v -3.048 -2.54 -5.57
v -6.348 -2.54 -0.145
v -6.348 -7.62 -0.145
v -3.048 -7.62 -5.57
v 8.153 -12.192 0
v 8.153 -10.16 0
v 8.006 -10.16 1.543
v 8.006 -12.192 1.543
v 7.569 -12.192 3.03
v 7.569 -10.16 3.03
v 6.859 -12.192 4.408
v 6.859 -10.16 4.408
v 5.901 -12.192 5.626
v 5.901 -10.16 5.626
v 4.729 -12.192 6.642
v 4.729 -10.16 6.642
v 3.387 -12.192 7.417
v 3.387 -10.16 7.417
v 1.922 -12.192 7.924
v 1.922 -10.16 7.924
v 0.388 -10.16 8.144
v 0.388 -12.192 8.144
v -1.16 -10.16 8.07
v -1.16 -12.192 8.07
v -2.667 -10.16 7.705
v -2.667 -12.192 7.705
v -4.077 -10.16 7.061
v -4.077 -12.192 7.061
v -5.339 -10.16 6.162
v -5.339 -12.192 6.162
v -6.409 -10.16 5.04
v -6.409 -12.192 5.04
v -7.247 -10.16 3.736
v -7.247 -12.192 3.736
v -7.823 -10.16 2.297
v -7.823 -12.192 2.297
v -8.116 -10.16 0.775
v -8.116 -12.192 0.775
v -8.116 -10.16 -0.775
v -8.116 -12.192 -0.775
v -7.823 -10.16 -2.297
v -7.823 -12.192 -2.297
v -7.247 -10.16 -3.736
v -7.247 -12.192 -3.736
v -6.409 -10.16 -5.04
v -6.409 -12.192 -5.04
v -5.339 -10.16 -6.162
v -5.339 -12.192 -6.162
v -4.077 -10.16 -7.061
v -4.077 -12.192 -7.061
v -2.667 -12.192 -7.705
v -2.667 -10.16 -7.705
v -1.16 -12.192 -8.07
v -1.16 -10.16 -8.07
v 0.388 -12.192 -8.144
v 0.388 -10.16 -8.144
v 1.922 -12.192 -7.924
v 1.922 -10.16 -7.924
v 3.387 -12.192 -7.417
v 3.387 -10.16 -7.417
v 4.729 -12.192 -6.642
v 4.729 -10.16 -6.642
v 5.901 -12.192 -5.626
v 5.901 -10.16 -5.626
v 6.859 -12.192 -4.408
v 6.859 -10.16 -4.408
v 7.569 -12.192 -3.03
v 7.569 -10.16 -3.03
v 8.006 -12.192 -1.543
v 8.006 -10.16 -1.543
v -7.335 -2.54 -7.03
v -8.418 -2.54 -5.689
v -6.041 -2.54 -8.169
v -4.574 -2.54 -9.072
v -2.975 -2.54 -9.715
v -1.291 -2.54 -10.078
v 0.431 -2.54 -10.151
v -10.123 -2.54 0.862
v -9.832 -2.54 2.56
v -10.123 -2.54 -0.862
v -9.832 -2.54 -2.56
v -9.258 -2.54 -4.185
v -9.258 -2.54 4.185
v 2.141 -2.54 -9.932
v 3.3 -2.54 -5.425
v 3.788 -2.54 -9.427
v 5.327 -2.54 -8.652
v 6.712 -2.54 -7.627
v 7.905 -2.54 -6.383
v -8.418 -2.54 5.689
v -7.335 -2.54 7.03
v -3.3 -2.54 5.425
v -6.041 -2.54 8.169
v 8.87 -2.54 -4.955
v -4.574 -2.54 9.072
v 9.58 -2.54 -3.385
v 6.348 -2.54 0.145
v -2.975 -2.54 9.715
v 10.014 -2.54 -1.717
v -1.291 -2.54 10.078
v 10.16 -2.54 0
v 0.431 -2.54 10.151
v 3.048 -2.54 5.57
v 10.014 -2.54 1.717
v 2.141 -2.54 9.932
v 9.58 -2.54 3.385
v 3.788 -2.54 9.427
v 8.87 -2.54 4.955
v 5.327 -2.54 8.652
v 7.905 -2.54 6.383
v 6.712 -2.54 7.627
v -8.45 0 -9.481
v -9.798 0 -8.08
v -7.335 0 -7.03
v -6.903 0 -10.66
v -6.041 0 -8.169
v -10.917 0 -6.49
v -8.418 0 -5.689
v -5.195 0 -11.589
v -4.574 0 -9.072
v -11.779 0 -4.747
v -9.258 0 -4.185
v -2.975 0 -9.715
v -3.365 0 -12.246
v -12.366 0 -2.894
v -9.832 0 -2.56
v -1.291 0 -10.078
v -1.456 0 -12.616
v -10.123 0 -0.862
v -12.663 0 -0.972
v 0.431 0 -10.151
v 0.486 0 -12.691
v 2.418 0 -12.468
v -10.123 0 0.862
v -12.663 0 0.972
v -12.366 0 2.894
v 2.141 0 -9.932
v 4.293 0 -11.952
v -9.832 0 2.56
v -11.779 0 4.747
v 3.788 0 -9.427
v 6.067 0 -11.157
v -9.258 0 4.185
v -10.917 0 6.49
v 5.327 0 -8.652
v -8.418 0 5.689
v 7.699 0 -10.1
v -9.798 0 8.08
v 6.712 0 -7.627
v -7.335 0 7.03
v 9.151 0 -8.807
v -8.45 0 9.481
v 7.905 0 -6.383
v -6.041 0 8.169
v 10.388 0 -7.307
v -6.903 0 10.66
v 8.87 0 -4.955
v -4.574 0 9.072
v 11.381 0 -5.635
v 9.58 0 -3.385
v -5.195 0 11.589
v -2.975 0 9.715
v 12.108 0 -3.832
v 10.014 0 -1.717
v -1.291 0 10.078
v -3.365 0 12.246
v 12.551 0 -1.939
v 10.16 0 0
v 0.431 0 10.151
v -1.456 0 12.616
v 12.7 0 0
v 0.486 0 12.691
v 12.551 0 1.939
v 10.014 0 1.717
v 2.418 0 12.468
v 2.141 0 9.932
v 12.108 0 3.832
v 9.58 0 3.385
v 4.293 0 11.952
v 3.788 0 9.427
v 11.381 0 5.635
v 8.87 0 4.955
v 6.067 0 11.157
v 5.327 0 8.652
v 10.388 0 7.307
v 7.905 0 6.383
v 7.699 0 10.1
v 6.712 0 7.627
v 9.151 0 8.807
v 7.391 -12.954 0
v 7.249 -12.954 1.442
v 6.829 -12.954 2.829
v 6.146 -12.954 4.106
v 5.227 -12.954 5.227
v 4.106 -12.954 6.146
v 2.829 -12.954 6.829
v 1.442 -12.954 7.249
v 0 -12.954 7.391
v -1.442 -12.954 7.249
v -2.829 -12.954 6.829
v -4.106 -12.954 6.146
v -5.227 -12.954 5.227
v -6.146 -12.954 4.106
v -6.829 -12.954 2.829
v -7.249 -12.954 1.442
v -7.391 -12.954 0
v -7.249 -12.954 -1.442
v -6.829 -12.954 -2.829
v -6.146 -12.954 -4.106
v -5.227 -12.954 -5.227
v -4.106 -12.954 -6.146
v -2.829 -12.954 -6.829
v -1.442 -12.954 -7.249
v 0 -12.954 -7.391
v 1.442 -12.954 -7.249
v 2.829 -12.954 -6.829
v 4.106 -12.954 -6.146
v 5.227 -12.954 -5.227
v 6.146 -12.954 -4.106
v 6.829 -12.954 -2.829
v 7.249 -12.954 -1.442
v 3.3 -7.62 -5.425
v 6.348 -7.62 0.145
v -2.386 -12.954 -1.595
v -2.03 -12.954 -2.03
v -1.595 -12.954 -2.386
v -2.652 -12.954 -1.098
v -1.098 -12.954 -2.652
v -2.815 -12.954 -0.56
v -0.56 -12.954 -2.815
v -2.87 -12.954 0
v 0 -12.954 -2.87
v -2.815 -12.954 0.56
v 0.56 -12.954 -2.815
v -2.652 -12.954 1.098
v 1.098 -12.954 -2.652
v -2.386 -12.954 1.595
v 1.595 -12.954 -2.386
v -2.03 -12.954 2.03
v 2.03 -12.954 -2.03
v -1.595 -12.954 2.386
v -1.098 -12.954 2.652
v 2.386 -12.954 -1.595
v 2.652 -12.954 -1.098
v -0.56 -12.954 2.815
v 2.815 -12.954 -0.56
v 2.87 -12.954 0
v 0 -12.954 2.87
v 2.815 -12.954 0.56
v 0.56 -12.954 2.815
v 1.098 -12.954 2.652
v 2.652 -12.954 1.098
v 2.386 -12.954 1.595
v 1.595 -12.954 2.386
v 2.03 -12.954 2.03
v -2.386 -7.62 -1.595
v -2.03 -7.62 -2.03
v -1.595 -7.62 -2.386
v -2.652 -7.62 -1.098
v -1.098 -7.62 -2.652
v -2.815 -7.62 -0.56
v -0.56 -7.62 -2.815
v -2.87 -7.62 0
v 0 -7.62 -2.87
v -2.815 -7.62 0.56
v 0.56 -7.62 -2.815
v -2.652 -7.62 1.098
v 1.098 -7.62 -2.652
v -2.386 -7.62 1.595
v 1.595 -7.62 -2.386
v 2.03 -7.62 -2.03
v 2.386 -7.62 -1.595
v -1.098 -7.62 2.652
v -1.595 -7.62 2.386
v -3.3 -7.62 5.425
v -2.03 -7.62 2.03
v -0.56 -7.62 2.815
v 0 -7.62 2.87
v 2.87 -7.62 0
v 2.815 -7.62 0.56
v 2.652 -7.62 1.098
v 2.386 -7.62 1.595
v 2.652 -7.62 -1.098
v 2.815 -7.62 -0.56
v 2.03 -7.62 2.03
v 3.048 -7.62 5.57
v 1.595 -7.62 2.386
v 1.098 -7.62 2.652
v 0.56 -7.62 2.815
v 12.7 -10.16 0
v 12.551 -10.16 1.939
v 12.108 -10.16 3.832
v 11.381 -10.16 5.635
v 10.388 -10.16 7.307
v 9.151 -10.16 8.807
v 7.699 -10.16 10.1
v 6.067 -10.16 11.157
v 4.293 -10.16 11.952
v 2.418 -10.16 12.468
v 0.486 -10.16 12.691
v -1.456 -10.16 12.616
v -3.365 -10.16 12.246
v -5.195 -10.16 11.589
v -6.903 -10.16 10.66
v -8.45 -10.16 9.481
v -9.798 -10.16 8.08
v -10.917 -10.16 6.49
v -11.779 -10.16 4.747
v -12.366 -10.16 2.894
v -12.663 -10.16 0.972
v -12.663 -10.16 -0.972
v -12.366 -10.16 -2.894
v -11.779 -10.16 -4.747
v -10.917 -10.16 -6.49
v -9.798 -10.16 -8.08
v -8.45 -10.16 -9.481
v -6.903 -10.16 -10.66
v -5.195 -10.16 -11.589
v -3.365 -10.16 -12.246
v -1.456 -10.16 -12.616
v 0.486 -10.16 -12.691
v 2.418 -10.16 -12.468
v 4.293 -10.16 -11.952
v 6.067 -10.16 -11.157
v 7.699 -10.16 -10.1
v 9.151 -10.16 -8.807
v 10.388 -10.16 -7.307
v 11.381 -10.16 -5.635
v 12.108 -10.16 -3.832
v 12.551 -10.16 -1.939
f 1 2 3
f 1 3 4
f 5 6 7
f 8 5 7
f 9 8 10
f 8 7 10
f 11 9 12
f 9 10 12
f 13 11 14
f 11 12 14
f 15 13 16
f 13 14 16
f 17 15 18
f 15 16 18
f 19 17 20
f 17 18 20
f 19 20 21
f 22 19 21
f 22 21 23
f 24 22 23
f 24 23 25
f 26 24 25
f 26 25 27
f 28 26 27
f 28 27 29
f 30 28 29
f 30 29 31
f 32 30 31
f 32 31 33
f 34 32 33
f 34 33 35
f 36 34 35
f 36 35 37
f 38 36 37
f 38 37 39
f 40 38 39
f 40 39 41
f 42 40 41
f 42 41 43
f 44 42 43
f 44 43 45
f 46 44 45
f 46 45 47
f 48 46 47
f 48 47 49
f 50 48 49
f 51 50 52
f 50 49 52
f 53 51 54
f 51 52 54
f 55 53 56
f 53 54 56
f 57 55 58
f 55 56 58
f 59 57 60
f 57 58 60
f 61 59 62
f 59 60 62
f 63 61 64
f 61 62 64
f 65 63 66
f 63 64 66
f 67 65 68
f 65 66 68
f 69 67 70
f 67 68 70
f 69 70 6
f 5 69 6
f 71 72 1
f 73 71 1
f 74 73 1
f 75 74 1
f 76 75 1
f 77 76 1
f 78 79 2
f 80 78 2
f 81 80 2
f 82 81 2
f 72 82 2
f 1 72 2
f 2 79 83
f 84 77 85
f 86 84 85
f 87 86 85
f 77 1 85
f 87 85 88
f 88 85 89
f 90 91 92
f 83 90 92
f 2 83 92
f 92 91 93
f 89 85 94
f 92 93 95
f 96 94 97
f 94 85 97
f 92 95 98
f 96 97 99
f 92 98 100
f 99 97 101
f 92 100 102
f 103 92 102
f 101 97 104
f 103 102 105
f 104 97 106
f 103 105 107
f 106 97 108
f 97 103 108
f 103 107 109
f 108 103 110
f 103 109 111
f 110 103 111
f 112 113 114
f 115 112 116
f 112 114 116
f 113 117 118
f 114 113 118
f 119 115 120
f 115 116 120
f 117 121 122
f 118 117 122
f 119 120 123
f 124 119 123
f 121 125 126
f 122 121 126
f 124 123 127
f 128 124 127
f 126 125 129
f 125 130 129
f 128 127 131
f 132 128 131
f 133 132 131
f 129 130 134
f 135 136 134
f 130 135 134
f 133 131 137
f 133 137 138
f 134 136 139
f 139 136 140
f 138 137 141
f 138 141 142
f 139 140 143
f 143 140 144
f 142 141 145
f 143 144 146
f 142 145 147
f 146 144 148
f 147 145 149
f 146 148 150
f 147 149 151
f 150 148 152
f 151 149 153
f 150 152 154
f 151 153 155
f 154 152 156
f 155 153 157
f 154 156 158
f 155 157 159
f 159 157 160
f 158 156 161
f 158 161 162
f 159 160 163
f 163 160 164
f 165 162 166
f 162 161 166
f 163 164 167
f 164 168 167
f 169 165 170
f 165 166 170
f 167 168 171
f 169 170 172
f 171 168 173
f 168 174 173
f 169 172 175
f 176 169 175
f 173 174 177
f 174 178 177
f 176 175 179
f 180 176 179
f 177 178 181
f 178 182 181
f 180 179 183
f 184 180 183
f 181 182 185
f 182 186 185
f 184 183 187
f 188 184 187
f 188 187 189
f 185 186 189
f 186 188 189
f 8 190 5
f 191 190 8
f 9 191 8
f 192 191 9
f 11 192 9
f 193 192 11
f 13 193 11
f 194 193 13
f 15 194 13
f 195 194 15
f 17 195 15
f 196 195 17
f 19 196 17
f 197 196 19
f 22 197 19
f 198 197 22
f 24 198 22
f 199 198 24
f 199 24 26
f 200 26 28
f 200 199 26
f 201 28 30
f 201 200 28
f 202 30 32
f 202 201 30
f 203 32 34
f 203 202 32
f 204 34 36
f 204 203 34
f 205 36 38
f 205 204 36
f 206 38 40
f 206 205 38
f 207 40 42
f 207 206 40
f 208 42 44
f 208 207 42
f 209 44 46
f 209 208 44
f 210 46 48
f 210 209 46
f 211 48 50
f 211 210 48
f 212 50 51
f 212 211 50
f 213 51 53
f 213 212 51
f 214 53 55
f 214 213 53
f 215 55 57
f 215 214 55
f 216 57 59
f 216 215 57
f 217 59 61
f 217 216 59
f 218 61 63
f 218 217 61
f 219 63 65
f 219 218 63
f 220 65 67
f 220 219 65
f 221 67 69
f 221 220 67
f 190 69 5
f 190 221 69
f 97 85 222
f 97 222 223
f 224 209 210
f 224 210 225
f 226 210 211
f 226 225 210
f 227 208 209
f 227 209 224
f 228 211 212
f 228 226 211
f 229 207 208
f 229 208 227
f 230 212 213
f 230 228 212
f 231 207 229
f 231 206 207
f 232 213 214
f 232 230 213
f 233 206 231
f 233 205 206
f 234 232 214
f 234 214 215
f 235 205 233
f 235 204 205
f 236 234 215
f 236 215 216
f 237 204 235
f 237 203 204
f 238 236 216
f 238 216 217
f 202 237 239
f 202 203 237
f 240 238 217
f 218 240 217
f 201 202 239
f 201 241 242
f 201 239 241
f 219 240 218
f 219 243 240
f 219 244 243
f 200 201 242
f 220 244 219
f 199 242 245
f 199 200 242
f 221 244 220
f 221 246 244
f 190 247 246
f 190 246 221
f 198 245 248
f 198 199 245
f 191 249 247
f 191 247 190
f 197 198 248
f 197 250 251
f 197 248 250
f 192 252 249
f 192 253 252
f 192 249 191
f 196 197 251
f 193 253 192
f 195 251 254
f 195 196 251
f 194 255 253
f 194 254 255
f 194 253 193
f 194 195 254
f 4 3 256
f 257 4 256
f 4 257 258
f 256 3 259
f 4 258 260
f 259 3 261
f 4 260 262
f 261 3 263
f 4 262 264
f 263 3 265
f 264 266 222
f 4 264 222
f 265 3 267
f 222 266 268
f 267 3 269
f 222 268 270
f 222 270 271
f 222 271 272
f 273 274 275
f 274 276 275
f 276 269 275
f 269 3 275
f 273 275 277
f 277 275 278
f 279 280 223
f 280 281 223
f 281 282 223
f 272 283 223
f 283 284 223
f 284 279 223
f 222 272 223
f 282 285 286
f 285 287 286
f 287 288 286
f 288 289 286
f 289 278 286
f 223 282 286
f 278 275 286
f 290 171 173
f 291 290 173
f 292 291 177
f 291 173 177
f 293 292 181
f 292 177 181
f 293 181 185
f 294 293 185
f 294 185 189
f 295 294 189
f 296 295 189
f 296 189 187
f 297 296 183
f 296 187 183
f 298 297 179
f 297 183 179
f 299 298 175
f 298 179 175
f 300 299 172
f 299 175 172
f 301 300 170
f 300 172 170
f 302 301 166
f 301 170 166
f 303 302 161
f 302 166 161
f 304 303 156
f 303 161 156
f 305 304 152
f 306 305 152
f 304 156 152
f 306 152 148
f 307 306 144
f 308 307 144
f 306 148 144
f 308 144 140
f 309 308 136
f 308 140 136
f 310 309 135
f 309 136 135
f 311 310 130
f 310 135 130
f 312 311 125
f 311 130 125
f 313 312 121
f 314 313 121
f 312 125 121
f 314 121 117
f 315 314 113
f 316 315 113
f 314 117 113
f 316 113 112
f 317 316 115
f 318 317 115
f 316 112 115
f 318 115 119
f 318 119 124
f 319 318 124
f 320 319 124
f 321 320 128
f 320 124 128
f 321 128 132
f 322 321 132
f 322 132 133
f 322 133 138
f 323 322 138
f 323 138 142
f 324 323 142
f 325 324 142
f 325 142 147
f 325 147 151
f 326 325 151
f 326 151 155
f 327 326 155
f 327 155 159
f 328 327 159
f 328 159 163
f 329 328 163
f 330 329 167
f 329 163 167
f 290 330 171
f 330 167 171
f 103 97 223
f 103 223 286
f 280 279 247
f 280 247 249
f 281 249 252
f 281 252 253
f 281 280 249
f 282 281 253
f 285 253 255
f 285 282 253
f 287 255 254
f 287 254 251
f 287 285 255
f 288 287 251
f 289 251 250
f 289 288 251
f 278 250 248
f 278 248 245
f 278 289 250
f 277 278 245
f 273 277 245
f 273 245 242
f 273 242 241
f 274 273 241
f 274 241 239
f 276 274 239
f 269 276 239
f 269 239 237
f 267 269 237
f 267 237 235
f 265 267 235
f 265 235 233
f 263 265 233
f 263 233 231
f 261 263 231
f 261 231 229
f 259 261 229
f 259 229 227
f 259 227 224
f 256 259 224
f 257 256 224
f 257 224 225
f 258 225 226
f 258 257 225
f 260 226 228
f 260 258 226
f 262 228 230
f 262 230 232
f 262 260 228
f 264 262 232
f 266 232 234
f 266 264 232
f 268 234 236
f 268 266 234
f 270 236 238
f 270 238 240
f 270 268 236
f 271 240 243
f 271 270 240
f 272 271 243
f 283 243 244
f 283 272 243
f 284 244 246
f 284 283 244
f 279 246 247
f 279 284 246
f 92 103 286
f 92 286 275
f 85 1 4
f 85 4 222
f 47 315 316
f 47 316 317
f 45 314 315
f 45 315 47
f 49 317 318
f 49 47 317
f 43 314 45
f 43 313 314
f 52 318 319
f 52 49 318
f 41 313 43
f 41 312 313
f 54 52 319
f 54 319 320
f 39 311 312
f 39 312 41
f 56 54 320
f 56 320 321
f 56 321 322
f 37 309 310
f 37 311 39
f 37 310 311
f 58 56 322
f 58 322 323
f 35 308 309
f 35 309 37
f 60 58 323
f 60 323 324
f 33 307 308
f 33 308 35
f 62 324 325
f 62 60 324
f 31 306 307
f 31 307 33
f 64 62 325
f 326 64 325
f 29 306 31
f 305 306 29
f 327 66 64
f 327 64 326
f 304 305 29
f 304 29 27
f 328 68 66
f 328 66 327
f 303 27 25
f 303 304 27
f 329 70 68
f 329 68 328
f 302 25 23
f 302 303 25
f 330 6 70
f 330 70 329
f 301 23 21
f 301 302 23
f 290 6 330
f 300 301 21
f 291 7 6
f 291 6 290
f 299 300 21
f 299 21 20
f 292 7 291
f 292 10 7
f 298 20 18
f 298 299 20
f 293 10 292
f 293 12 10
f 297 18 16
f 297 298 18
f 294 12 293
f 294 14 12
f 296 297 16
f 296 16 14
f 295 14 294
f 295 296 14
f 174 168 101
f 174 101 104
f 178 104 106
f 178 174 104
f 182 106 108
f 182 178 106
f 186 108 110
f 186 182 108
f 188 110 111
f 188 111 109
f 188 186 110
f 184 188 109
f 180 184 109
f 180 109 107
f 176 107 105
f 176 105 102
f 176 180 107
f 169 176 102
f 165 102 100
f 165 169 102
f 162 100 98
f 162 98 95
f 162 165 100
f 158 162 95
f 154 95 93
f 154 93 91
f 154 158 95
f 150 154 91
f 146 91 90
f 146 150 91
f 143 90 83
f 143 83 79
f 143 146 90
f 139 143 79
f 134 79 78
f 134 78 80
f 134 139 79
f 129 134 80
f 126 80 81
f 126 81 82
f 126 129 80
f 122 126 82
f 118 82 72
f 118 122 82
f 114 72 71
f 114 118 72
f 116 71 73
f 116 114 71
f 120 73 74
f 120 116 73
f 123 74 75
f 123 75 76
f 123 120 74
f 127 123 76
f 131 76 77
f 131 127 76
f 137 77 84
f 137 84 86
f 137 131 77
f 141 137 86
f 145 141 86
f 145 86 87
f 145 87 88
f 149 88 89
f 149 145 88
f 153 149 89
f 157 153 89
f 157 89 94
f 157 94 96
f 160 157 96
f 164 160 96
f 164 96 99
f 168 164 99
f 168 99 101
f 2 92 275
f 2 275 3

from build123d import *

# Parameters (mm, degrees)
F0_R     = 12.7
F0_R_2   = 10.16
F0_R_3   = 8.1534
F0_R_4   = 2.8702
F1_DEPTH = 10.16
F2_DEPTH = 12.954
F3_DEPTH = 2.54
F4_DEPTH = 7.62
F5_SIZE  = 0.762


with BuildPart() as f1:
    # F0 (on Front) → F1 (new body)
    with BuildSketch(Plane.XZ):
        Circle(F0_R)
        Circle(F0_R_2, mode=Mode.SUBTRACT)
        Circle(F0_R_2)
        Circle(F0_R_3, mode=Mode.SUBTRACT)
        Circle(F0_R_3)
        Polygon((-3.299791, 5.425082), (3.048363, 5.570244), (6.348154, 0.145162), (3.299791, -5.425082), (-3.048363, -5.570244), (-6.348154, -0.145162), align=None, mode=Mode.SUBTRACT)
        Polygon((6.348154, 0.145162), (3.048363, 5.570244), (-3.299791, 5.425082), (-6.348154, -0.145162), (-3.048363, -5.570244), (3.299791, -5.425082), align=None)
        Circle(F0_R_4, mode=Mode.SUBTRACT)
    extrude(amount=F1_DEPTH)

    # F0 (on Front) → F2 (join)
    with BuildSketch(Plane.XZ):
        Circle(F0_R_3)
        Polygon((-3.299791, 5.425082), (3.048363, 5.570244), (6.348154, 0.145162), (3.299791, -5.425082), (-3.048363, -5.570244), (-6.348154, -0.145162), align=None, mode=Mode.SUBTRACT)
        Polygon((6.348154, 0.145162), (3.048363, 5.570244), (-3.299791, 5.425082), (-6.348154, -0.145162), (-3.048363, -5.570244), (3.299791, -5.425082), align=None)
        Circle(F0_R_4, mode=Mode.SUBTRACT)
    extrude(amount=F2_DEPTH)

    # F0 (on Front) → F3 (cut)
    with BuildSketch(Plane.XZ):
        Circle(F0_R_2)
        Circle(F0_R_3, mode=Mode.SUBTRACT)
        Circle(F0_R_3)
        Polygon((-3.299791, 5.425082), (3.048363, 5.570244), (6.348154, 0.145162), (3.299791, -5.425082), (-3.048363, -5.570244), (-6.348154, -0.145162), align=None, mode=Mode.SUBTRACT)
        Polygon((6.348154, 0.145162), (3.048363, 5.570244), (-3.299791, 5.425082), (-6.348154, -0.145162), (-3.048363, -5.570244), (3.299791, -5.425082), align=None)
        Circle(F0_R_4, mode=Mode.SUBTRACT)
    extrude(amount=F3_DEPTH, mode=Mode.SUBTRACT)

    # F0 (on Front) → F4 (cut)
    with BuildSketch(Plane.XZ):
        Polygon((6.348154, 0.145162), (3.048363, 5.570244), (-3.299791, 5.425082), (-6.348154, -0.145162), (-3.048363, -5.570244), (3.299791, -5.425082), align=None)
        Circle(F0_R_4, mode=Mode.SUBTRACT)
    extrude(amount=F4_DEPTH, mode=Mode.SUBTRACT)

    # F5
    f5_edges = [f1.edges().sort_by_distance(p)[0] for p in [
        (-8.1534, -12.954, 0),
    ]]
    chamfer(f5_edges, length=F5_SIZE)


solid = f1.part
